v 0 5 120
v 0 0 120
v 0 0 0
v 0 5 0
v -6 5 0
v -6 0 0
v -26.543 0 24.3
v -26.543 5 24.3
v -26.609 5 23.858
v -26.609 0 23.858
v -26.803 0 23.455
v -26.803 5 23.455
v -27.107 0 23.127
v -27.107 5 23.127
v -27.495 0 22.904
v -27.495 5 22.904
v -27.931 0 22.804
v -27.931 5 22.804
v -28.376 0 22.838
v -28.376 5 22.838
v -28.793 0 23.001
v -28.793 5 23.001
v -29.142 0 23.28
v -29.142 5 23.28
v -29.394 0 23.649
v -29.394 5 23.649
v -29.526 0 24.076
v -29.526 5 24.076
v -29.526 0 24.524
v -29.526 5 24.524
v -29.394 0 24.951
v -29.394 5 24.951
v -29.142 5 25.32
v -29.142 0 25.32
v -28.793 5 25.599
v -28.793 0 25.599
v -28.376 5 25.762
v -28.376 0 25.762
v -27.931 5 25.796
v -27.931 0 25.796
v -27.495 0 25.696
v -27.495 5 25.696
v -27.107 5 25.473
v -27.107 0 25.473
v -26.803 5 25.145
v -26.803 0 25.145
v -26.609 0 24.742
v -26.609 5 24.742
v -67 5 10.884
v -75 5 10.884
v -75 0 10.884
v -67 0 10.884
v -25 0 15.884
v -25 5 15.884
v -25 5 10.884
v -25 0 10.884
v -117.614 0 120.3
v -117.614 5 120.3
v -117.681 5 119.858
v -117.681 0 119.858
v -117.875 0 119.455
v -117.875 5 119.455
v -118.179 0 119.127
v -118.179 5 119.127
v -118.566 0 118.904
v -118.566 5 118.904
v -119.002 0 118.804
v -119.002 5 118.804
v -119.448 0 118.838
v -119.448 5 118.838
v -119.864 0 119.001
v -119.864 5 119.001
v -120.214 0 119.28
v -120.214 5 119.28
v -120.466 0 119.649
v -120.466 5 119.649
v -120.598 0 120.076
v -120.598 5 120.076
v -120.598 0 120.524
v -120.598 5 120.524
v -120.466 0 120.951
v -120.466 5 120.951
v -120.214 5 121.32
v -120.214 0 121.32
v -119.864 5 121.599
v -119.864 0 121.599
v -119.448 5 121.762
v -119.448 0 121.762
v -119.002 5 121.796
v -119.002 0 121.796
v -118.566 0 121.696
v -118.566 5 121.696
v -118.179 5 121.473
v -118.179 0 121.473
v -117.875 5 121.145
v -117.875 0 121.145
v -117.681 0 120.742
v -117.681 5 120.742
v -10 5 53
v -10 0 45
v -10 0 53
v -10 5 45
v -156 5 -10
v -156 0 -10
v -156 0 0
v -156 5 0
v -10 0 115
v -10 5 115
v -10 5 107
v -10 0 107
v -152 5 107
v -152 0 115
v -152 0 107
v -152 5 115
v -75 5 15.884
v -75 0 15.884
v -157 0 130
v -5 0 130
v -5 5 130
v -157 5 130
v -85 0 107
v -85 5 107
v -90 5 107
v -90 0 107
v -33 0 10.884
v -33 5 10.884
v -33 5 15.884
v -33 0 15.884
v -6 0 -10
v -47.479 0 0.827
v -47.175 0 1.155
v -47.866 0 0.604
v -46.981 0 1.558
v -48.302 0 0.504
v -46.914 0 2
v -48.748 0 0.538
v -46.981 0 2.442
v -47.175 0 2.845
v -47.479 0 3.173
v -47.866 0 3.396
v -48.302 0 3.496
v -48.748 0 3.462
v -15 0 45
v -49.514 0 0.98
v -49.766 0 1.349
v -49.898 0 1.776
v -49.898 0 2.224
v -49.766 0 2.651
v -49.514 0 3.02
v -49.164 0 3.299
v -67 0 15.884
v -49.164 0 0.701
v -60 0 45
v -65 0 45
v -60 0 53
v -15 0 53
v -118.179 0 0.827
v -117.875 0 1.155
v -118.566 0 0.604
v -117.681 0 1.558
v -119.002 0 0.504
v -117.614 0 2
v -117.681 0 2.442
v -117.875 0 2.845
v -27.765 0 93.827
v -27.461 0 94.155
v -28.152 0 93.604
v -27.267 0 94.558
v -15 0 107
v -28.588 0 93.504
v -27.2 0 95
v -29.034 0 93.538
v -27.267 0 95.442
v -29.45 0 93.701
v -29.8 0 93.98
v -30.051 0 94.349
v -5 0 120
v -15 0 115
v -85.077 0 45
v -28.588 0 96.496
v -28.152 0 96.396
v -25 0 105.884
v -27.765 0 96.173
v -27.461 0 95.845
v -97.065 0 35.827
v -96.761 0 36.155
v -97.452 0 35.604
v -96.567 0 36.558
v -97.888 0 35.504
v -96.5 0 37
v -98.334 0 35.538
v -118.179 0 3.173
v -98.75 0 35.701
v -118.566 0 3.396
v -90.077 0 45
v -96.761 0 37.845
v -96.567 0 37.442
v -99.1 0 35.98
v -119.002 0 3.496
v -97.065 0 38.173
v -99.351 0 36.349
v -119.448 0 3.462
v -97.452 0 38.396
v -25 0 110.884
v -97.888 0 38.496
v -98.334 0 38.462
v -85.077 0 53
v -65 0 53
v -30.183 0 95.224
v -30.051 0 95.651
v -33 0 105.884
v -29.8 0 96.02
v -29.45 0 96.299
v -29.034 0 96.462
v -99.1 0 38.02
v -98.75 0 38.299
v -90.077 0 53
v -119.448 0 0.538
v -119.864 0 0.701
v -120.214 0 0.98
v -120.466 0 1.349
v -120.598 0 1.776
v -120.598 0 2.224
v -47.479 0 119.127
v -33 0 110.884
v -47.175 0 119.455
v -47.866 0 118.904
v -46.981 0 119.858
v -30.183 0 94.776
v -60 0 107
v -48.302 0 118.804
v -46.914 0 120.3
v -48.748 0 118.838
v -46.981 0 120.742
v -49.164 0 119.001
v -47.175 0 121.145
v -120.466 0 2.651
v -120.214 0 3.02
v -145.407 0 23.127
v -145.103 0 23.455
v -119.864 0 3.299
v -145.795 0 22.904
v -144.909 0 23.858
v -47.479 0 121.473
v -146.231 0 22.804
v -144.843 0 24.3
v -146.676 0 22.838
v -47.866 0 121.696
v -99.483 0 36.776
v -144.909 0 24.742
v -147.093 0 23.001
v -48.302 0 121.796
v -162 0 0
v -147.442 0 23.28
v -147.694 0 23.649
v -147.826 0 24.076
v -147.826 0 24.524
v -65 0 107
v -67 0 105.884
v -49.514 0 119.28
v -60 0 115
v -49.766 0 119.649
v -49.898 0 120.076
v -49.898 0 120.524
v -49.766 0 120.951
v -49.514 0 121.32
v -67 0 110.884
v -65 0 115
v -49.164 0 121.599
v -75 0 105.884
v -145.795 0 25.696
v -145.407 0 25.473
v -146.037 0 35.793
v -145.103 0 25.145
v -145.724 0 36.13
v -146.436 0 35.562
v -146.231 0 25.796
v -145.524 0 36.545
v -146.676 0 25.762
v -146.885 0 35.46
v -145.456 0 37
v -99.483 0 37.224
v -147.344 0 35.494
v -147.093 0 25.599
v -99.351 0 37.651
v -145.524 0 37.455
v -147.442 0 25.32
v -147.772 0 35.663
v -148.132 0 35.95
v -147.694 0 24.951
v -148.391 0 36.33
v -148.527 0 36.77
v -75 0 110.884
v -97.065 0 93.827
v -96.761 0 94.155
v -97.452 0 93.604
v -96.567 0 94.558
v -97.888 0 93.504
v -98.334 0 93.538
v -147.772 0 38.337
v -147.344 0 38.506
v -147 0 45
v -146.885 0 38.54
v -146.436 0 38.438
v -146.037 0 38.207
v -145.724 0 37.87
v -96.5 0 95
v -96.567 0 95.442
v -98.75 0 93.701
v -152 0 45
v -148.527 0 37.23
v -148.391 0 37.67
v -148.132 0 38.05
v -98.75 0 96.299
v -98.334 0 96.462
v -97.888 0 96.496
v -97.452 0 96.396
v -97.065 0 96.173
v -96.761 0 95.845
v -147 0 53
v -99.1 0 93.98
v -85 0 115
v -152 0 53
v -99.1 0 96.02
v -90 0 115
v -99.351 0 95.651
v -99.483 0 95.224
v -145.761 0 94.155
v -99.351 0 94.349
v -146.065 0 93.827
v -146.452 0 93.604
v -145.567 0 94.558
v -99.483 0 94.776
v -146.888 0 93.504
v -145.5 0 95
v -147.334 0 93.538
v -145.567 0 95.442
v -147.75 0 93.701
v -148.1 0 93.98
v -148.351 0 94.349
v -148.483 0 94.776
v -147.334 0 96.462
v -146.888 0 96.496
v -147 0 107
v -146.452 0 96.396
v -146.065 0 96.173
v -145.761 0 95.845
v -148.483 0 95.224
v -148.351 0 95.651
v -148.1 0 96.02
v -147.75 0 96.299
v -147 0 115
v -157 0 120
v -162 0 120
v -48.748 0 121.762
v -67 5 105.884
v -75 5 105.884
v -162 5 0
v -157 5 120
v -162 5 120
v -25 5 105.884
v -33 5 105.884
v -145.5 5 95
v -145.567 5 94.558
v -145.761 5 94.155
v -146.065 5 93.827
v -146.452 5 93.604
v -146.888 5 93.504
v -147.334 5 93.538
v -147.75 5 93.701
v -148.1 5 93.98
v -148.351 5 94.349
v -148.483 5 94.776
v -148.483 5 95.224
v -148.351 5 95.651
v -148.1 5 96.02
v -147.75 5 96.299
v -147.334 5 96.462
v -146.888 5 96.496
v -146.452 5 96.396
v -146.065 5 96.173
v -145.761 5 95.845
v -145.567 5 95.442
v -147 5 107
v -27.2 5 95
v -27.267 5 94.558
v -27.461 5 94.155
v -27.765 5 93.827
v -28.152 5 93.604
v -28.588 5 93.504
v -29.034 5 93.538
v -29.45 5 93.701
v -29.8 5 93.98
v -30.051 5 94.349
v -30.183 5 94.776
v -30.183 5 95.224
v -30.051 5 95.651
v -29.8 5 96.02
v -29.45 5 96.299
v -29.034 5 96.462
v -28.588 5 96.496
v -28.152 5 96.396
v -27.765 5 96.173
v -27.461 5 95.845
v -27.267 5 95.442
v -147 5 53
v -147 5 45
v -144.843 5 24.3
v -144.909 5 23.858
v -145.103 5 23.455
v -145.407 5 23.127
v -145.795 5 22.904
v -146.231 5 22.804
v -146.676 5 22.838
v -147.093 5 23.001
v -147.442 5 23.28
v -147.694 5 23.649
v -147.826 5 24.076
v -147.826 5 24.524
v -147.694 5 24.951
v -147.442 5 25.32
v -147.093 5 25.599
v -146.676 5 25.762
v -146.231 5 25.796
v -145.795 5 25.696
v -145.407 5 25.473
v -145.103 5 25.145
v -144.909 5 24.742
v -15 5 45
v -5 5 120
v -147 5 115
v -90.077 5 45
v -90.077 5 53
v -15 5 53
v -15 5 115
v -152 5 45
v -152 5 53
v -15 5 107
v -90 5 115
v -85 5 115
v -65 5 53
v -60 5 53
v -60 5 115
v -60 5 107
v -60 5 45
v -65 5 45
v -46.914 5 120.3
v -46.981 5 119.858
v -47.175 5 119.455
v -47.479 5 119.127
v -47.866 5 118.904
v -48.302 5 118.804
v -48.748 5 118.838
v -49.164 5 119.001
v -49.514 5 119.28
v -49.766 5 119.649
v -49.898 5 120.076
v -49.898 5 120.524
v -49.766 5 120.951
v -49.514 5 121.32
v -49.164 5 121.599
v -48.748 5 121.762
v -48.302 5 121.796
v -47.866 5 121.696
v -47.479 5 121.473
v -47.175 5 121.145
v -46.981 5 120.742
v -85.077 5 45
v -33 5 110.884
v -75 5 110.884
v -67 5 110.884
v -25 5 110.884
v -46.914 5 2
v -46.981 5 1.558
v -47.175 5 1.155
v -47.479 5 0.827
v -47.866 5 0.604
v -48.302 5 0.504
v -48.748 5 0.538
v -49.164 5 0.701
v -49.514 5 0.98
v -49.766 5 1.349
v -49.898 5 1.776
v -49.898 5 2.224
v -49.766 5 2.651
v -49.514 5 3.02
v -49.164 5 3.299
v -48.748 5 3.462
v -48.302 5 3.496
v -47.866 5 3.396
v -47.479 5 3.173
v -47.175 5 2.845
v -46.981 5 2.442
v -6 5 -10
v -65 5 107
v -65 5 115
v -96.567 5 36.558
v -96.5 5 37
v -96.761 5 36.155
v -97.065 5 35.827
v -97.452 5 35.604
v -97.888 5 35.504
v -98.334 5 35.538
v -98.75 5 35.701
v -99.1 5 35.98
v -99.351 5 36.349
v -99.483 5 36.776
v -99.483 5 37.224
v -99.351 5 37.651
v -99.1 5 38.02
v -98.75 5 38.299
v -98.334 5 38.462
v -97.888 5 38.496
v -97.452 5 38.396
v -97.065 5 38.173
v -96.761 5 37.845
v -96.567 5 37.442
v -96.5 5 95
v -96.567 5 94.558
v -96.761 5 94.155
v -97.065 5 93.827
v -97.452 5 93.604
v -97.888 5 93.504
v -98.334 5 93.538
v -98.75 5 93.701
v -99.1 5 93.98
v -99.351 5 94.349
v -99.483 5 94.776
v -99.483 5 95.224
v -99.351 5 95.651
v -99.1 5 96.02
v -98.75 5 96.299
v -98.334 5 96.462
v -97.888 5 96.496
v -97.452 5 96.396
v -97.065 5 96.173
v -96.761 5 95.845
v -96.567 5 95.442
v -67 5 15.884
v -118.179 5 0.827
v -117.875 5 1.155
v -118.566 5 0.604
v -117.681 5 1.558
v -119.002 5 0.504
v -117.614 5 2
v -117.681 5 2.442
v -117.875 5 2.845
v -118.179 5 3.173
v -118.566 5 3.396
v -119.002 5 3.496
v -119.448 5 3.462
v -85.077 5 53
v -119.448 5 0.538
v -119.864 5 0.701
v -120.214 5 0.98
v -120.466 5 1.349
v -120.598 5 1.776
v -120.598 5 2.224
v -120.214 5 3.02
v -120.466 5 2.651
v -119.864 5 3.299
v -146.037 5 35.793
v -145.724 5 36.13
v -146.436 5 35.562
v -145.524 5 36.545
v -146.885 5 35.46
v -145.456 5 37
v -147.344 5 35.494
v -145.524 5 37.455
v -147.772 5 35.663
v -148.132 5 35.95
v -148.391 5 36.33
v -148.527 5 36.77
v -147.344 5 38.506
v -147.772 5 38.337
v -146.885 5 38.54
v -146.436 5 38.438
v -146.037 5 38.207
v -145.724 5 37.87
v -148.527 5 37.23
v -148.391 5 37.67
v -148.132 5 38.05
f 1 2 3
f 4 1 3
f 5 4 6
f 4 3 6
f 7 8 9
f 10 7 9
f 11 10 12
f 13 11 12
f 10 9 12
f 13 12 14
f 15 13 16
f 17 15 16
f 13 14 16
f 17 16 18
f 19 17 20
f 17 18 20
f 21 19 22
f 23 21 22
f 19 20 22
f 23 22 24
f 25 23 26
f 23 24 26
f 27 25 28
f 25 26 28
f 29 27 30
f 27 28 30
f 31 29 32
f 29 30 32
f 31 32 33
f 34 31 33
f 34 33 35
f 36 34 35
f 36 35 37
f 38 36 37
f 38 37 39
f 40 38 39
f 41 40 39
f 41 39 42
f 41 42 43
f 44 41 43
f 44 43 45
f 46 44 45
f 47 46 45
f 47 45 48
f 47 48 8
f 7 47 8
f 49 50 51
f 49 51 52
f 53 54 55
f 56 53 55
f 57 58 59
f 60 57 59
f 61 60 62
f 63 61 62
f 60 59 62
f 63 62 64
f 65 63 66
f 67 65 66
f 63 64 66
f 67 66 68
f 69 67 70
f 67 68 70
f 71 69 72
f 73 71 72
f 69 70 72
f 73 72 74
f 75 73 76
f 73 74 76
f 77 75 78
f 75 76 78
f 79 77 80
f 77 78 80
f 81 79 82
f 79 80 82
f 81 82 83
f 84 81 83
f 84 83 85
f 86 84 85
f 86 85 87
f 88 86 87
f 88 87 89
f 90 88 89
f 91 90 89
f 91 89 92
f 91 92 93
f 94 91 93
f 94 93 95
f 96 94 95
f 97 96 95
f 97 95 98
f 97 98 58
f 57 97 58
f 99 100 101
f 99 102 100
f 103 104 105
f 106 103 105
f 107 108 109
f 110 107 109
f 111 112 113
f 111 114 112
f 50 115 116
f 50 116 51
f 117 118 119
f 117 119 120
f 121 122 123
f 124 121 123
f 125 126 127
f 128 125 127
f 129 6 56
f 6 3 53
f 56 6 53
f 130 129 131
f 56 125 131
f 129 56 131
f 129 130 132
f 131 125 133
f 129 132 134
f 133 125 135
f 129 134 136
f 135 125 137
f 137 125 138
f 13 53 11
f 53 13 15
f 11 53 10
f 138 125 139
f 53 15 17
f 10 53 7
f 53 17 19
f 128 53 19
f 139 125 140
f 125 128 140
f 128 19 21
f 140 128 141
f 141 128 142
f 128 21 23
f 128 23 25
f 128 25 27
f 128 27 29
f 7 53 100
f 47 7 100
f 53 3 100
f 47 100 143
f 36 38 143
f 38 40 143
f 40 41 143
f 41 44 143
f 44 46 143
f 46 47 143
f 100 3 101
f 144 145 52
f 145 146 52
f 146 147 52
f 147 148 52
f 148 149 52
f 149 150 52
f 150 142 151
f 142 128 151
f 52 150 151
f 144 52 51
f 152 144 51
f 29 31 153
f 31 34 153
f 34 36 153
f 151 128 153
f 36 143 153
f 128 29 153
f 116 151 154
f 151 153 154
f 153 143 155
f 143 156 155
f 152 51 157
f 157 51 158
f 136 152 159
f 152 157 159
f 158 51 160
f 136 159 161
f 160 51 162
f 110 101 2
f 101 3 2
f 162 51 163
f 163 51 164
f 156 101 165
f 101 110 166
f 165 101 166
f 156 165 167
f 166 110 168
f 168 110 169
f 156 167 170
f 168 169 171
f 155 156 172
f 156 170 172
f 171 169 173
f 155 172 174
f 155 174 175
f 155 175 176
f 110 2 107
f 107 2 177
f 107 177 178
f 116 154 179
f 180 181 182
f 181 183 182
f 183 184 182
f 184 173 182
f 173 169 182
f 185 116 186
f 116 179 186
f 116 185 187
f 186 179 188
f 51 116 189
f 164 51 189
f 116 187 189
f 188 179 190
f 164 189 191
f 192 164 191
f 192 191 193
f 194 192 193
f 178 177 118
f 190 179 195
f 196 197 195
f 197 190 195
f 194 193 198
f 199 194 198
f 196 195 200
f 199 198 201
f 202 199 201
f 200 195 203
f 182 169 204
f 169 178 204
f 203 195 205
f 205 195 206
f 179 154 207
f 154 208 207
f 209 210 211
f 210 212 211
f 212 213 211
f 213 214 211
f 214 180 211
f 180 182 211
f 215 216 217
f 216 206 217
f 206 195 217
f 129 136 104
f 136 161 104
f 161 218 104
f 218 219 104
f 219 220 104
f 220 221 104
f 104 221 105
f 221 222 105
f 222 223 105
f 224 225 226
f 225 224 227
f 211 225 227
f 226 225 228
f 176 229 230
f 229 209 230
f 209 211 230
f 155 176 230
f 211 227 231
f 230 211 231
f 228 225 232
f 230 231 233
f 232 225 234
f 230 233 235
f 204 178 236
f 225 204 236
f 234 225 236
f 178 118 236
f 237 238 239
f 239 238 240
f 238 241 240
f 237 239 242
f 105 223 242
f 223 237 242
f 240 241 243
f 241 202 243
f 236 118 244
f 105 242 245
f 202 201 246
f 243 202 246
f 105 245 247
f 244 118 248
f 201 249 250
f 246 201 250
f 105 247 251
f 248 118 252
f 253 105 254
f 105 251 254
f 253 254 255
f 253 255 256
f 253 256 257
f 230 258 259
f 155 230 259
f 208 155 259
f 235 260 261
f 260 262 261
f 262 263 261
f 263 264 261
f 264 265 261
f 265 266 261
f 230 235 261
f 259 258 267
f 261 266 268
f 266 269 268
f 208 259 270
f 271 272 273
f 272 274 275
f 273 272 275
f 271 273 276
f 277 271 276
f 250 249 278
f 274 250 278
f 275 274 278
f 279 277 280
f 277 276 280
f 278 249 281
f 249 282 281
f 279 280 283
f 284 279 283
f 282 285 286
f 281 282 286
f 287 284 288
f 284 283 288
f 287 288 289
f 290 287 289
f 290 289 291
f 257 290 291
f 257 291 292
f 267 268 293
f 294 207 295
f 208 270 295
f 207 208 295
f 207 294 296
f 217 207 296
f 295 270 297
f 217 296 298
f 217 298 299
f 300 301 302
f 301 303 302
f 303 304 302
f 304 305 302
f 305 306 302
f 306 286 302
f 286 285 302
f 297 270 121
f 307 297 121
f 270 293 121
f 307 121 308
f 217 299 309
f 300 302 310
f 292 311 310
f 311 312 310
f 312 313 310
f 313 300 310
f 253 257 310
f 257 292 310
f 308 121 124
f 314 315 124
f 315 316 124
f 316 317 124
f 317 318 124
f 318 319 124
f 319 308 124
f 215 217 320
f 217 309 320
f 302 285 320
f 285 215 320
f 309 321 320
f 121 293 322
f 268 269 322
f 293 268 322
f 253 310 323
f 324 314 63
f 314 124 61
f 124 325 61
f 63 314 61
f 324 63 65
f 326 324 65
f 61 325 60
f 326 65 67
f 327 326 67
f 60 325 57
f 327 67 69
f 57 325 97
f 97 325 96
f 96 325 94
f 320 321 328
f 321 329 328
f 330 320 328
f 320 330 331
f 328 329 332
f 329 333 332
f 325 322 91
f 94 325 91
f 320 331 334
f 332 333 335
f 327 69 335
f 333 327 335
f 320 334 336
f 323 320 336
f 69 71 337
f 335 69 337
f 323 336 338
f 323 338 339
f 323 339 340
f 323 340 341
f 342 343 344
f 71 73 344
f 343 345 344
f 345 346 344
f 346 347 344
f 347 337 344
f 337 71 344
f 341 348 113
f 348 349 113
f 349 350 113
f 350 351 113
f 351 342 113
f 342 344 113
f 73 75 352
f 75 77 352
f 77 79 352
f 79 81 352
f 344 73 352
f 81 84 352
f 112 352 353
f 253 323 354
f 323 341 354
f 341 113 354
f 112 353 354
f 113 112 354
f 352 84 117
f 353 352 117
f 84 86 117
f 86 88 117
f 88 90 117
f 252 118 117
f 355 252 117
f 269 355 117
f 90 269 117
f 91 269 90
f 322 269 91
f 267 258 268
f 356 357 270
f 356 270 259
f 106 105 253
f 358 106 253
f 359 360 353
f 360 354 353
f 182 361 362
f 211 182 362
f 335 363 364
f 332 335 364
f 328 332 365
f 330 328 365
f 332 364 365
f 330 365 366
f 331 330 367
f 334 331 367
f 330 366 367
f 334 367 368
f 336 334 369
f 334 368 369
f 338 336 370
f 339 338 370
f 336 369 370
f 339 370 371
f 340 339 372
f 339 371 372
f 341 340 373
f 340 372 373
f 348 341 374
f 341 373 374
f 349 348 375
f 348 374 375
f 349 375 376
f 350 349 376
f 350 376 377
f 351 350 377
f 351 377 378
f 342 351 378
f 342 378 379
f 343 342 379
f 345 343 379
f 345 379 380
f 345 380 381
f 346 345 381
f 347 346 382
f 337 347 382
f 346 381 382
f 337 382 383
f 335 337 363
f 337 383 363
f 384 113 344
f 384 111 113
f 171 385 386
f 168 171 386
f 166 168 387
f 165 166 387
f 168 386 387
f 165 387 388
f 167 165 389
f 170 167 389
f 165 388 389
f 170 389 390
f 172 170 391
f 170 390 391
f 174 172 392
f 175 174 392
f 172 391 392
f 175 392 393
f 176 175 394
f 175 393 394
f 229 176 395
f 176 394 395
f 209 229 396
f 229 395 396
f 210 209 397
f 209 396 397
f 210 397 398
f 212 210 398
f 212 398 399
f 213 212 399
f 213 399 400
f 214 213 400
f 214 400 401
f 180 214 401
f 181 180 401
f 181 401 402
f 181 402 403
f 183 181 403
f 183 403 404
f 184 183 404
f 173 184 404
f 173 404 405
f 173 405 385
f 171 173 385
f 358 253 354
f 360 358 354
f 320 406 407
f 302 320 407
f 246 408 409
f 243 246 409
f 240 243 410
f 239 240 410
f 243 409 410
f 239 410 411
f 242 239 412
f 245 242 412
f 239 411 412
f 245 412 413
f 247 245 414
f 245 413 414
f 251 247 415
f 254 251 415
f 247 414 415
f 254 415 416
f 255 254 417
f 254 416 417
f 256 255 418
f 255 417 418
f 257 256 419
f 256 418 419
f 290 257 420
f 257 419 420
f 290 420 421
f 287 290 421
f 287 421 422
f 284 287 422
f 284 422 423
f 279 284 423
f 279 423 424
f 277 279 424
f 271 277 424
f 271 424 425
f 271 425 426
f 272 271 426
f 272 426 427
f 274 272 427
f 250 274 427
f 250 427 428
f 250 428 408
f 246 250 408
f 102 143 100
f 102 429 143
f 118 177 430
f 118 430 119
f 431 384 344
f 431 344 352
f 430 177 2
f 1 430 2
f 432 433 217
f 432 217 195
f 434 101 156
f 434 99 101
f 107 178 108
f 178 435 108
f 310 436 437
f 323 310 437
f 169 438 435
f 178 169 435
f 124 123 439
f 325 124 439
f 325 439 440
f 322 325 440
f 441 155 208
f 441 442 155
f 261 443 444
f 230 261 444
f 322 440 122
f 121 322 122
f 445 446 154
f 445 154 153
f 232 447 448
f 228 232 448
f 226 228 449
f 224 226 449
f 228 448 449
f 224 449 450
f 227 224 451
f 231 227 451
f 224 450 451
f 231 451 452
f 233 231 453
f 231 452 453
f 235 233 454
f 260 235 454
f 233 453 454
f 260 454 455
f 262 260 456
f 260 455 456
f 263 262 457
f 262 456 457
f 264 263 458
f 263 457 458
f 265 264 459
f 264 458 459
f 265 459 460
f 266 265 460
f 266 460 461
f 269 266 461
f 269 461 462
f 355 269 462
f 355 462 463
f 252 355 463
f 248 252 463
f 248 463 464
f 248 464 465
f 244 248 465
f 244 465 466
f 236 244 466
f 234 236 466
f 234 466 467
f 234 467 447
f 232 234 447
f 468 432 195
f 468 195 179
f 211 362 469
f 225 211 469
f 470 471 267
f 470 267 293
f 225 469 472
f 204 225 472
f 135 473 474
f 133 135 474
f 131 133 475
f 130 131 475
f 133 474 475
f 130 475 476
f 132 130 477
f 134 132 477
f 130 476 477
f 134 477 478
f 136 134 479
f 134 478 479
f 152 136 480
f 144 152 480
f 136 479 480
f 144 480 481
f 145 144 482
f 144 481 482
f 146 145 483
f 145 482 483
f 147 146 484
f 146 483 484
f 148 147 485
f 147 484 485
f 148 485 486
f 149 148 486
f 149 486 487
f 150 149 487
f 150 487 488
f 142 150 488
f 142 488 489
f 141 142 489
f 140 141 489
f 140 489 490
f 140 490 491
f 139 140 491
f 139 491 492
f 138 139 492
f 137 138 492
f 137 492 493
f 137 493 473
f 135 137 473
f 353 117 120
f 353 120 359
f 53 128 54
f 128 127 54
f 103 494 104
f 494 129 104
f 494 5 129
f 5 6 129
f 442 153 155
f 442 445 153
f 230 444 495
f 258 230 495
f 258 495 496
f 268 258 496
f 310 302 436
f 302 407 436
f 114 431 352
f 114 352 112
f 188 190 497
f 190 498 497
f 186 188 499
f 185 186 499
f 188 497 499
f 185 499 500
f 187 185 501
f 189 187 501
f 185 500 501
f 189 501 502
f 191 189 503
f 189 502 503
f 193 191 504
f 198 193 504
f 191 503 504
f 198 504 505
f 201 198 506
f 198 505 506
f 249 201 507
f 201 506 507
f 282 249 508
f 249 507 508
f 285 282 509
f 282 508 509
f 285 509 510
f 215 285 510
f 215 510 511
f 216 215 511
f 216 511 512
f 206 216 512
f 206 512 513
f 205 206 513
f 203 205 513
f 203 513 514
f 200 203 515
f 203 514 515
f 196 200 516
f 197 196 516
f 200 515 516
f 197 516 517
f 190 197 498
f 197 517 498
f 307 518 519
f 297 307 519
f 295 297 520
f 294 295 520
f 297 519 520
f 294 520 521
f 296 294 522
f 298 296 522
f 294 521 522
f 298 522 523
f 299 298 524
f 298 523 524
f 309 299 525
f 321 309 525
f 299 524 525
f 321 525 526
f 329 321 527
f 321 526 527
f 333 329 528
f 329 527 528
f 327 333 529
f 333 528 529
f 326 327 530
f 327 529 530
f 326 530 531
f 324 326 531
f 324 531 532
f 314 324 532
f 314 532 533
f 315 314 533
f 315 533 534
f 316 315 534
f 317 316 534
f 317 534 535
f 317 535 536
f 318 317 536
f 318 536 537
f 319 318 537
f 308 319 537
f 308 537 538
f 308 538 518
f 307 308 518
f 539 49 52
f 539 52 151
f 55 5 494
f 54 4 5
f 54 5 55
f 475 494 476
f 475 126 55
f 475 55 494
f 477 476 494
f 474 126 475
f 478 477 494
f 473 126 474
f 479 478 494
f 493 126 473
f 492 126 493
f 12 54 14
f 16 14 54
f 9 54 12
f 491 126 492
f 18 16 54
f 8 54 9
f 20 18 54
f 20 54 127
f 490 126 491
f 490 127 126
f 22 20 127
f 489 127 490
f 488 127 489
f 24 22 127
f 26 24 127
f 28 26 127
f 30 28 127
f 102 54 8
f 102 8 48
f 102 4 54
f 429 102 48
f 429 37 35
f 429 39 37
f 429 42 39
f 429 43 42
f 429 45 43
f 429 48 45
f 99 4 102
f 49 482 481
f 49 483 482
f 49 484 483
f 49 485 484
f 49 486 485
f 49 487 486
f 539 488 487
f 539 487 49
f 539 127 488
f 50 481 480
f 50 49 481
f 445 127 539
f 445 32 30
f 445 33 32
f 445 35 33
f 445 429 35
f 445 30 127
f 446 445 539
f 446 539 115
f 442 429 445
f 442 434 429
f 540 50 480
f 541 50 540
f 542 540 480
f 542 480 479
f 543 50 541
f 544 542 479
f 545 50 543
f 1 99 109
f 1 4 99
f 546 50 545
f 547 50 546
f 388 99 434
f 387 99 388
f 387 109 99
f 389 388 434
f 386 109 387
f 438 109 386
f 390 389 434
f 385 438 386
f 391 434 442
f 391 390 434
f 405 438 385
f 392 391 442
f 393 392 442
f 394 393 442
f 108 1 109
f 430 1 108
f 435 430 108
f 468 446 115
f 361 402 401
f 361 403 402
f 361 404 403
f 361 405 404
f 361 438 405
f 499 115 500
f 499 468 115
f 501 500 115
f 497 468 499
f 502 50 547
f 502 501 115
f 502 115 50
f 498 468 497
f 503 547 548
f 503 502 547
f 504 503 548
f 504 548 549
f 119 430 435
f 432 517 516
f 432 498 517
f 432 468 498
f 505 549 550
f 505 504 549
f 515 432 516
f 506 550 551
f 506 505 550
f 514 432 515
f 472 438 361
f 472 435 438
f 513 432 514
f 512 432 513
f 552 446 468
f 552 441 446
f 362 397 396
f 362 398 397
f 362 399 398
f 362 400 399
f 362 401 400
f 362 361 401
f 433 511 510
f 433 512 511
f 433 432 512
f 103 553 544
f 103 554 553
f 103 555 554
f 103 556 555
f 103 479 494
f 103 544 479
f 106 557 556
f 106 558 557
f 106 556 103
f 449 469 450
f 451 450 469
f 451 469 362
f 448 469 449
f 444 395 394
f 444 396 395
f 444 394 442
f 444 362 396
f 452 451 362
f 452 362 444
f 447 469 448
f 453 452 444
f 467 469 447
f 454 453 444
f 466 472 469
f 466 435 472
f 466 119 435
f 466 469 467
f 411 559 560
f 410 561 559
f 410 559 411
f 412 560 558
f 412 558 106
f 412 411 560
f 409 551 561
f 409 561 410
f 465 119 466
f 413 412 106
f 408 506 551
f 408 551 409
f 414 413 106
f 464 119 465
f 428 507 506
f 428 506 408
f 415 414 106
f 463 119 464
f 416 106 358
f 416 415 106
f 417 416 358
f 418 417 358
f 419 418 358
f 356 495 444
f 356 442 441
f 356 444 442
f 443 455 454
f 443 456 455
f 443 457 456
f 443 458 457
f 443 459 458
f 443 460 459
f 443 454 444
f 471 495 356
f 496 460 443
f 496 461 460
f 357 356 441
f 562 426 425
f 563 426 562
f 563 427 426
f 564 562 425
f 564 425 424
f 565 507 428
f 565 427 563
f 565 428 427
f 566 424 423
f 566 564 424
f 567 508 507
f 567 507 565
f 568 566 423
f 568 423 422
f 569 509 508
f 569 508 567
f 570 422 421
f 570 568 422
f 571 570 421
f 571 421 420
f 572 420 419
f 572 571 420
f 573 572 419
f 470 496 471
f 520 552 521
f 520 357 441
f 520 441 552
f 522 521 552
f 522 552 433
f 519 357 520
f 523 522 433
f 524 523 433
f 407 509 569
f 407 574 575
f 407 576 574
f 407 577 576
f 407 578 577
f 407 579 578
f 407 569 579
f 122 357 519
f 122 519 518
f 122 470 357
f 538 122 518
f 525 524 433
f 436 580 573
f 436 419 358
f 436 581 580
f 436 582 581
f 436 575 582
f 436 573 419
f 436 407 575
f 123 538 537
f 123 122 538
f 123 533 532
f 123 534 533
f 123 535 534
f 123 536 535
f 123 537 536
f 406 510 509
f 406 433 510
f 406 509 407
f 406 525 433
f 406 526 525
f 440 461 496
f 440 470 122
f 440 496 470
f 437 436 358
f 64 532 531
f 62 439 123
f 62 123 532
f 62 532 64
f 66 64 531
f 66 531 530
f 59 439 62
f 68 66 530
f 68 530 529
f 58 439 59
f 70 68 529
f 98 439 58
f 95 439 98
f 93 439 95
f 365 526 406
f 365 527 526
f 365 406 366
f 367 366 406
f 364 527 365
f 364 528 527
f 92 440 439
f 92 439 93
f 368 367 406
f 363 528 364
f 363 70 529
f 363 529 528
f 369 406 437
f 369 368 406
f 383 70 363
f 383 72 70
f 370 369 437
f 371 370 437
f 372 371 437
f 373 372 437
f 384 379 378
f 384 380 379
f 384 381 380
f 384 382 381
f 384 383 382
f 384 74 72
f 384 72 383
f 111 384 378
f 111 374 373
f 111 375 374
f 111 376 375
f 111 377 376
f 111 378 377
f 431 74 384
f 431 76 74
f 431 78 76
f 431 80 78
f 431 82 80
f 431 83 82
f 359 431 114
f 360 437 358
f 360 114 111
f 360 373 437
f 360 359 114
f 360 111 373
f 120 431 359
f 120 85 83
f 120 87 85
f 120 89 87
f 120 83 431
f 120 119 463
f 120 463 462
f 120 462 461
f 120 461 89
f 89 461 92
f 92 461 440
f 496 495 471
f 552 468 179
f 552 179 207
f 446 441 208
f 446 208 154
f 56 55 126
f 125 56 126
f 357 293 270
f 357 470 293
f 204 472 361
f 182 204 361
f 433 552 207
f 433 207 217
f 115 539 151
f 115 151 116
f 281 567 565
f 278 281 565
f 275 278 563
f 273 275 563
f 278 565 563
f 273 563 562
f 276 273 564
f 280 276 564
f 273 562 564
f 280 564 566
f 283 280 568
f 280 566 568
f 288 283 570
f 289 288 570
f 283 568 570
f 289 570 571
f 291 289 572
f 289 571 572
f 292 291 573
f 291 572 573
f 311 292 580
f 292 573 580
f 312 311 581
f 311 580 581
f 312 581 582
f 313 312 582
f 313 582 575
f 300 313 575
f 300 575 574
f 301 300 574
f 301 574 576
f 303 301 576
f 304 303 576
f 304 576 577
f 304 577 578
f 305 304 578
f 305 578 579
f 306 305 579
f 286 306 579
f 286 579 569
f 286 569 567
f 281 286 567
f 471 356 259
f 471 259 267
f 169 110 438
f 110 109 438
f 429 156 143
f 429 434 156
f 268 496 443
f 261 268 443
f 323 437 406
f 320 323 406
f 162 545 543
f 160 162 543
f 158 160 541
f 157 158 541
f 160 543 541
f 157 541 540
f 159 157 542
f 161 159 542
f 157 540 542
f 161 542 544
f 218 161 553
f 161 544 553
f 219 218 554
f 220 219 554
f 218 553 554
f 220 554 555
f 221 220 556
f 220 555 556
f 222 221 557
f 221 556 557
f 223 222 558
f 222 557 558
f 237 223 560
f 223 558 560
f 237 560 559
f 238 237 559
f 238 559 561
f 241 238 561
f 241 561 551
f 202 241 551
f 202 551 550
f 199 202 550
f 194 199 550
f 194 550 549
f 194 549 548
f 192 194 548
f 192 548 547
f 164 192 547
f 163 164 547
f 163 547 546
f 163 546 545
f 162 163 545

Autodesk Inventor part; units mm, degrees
ref_plane "YZ Plane" through (0, 0, 0) normal (1, 0, 0) x (0, 1, 0)
ref_plane "XZ Plane" through (0, 0, 0) normal (0, 1, 0) x (-1, 0, 0)
ref_plane "XY Plane" through (0, 0, 0) normal (0, 0, 1) x (1, 0, 0)
sketch "Sketch1" plane through (0, 0, 0) normal (0, 1, 0) x (-1, 0, 0)
  line L0 (0, 0) -> (162, 0)
  line L1 (162, 0) -> (162, 120)
  line L2 (162, 120) -> (0, 120)
  line L3 (0, 120) -> (0, 0)
  line L4 (157, 120) -> (5, 120)
  line L5 (5, 120) -> (5, 130)
  line L6 (5, 130) -> (157, 130)
  line L7 (157, 130) -> (157, 120)
  line L8 (156, 0) -> (6, 0)
  line L9 (6, 0) -> (6, -10)
  line L10 (6, -10) -> (156, -10)
  line L11 (156, -10) -> (156, 0)
  dimension "d0" = 120
  dimension "d1" = 162
  dimension "d2" = 5
  dimension "d3" = 5
  dimension "d4" = 10
  dimension "d5" = 10
  dimension "d6" = 150
extrude "Extrusion1" add sketch "Sketch1" along normal blind 5
sketch "Sketch2" plane through (0, 5, 0) normal (0, 1, 0) x (1, 0, 0)
  circle A0 centre (-147, -37) radius 1.5444
  circle A1 centre (-98, -37) radius 1.5
  circle A2 centre (-98, -95) radius 1.5
  circle A3 centre (-147, -95) radius 1.5
  circle A4 centre (-28.0426, -24.3) radius 1.5
  circle A5 centre (-146.3426, -24.3) radius 1.5
  circle A6 centre (-28.7, -95) radius 1.5
  line L0 (-75, -105.8843) -> (-67, -105.8843)
  line L1 (-67, -105.8843) -> (-67, -110.8843)
  line L2 (-67, -110.8843) -> (-75, -110.8843)
  line L3 (-75, -110.8843) -> (-75, -105.8843)
  line L4 (-75, -10.8843) -> (-67, -10.8843)
  line L5 (-67, -10.8843) -> (-67, -15.8843)
  line L6 (-67, -15.8843) -> (-75, -15.8843)
  line L7 (-75, -15.8843) -> (-75, -10.8843)
  line L8 (-25, -10.8843) -> (-33, -10.8843)
  line L9 (-33, -10.8843) -> (-33, -15.8843)
  line L10 (-33, -15.8843) -> (-25, -15.8843)
  line L11 (-25, -15.8843) -> (-25, -10.8843)
  line L12 (-25, -105.8843) -> (-33, -105.8843)
  line L13 (-33, -105.8843) -> (-33, -110.8843)
  line L14 (-33, -110.8843) -> (-25, -110.8843)
  line L15 (-25, -110.8843) -> (-25, -105.8843)
  line L16 (-15, -45) -> (-10, -45)
  line L17 (-10, -45) -> (-10, -53)
  line L18 (-10, -53) -> (-15, -53)
  line L19 (-15, -53) -> (-15, -45)
  line L20 (-65, -45) -> (-60, -45)
  line L21 (-60, -45) -> (-60, -53)
  line L22 (-60, -53) -> (-65, -53)
  line L23 (-65, -53) -> (-65, -45)
  line L24 (-60, -107) -> (-65, -107)
  line L25 (-65, -107) -> (-65, -115)
  line L26 (-65, -115) -> (-60, -115)
  line L27 (-60, -115) -> (-60, -107)
  line L28 (-10, -107) -> (-15, -107)
  line L29 (-15, -107) -> (-15, -115)
  line L30 (-15, -115) -> (-10, -115)
  line L31 (-10, -115) -> (-10, -107)
  line L32 (-162, 0) -> (-162, -120) projected
  line L33 (-157, -130) -> (-5, -130) projected
  line L34 (0, -120) -> (0, 0) projected
  line L35 (-152, -107) -> (-147, -107)
  line L36 (-147, -107) -> (-147, -115)
  line L37 (-147, -115) -> (-152, -115)
  line L38 (-152, -115) -> (-152, -107)
  line L39 (-147, -45) -> (-152, -45)
  line L40 (-152, -45) -> (-152, -53)
  line L41 (-152, -53) -> (-147, -53)
  line L42 (-147, -53) -> (-147, -45)
  line L43 (-90.0773, -45) -> (-85.0773, -45)
  line L44 (-85.0773, -45) -> (-85.0773, -53)
  line L45 (-85.0773, -53) -> (-90.0773, -53)
  line L46 (-90.0773, -53) -> (-90.0773, -45)
  line L47 (-85, -107) -> (-90, -107)
  line L48 (-90, -107) -> (-90, -115)
  line L49 (-90, -115) -> (-85, -115)
  line L50 (-85, -115) -> (-85, -107)
  dimension "d9" = 3
  dimension "d10" = 15
  dimension "d11" = 58
  dimension "d12" = 49
  dimension "d13" = 49
  dimension "d14" = 58
  dimension "d15" = 3
  dimension "d16" = 3
  dimension "d17" = 3.0888
  dimension "d18" = 35
  dimension "d19" = 70.7
  dimension "d20" = 118.3
  dimension "d21" = 70.7
  dimension "d22" = 118.3
  dimension "d23" = 3
  dimension "d24" = 3
  dimension "d25" = 3
  dimension "d26" = 5
  dimension "d27" = 8
  dimension "d28" = 8
  dimension "d29" = 5
  dimension "d30" = 8
  dimension "d31" = 5
  dimension "d32" = 5
  dimension "d33" = 8
  dimension "d34" = 8
  dimension "d35" = 5
  dimension "d36" = 5
  dimension "d37" = 8
  dimension "d38" = 8
  dimension "d39" = 5
  dimension "d40" = 5
  dimension "d41" = 8
  dimension "d42" = 50
  dimension "d43" = 25
  dimension "d44" = 50
  dimension "d45" = 25
  dimension "d46" = 90
  dimension "d47" = 90
  dimension "d48" = 55
  dimension "d49" = 55
  dimension "d50" = 70
  dimension "d51" = 70
  dimension "d52" = 10
  dimension "d55" = 35
  dimension "d56" = 15
  dimension "d57" = 15
  dimension "d58" = 8
  dimension "d59" = 10
  dimension "d60" = 5
  dimension "d61" = 5
  dimension "d62" = 8
  dimension "d63" = 10
  dimension "d64" = 70
  dimension "d65" = 5
  dimension "d66" = 5
  dimension "d67" = 8
  dimension "d68" = 8
  dimension "d69" = 70
  dimension "d70" = 0
  dimension "d71" = 0
extrude "Extrusion2" cut sketch "Sketch2" against normal mid plane 40
sketch "Sketch4" plane through (0, 5, 0) normal (0, 1, 0) x (1, 0, 0)
  circle A0 centre (-48.4143, -2) radius 1.5
  circle A1 centre (-119.1143, -2) radius 1.5
  circle A2 centre (-119.1143, -120.3) radius 1.5
  circle A3 centre (-48.4143, -120.3) radius 1.5
  circle A4 centre (-146.3426, -24.3) radius 1.5 projected
  circle A5 centre (-28.0426, -24.3) radius 1.5 projected
  circle A6 centre (-28.7, -95) radius 1.5 projected
  line L0 (-6, 10) -> (-156, 10) projected
  point P0 (0, 0)
  dimension "d72" = 118.3
  dimension "d73" = 70.7
  dimension "d74" = 118.3
  dimension "d75" = 70.7
  dimension "d76" = 70.7
  dimension "d77" = 118.3
  dimension "d78" = 3
  dimension "d79" = 3
  dimension "d80" = 3
  dimension "d81" = 3
  dimension "d82" = 3
  dimension "d83" = 12
  dimension "d84" = 12
extrude "Extrusion3" cut sketch "Sketch4" against normal mid plane 30 contours A0 | A1 | A2 | A3
equation "\"d2\" = d3"
equation "\"d3\" = WoodWidth"
equation "\"d7\" = WoodWidth"
equation "\"d14\" = d11"
equation "\"d16\" = d15"
equation "\"d21\" = d19"
equation "\"d22\" = d20"
equation "\"d23\" = d9"
equation "\"d24\" = d9"
equation "\"d25\" = d9"
equation "\"d45\" = d43"
equation "\"d55\" = d18"
equation "\"d57\" = d56"
equation "\"d74\" = d72"
equation "\"d75\" = d73"
equation "\"d76\" = d75"
equation "\"d77\" = d74"
equation "\"d78\" = d79"
equation "\"d80\" = d78"
equation "\"d81\" = d78"
equation "\"d82\" = d78"
equation "\"d84\" = d83"
equation "\"WoodWidth\" = 5"
equation "\"LaserWith\" = 0.3"
properties part number "BoardCarrier"
